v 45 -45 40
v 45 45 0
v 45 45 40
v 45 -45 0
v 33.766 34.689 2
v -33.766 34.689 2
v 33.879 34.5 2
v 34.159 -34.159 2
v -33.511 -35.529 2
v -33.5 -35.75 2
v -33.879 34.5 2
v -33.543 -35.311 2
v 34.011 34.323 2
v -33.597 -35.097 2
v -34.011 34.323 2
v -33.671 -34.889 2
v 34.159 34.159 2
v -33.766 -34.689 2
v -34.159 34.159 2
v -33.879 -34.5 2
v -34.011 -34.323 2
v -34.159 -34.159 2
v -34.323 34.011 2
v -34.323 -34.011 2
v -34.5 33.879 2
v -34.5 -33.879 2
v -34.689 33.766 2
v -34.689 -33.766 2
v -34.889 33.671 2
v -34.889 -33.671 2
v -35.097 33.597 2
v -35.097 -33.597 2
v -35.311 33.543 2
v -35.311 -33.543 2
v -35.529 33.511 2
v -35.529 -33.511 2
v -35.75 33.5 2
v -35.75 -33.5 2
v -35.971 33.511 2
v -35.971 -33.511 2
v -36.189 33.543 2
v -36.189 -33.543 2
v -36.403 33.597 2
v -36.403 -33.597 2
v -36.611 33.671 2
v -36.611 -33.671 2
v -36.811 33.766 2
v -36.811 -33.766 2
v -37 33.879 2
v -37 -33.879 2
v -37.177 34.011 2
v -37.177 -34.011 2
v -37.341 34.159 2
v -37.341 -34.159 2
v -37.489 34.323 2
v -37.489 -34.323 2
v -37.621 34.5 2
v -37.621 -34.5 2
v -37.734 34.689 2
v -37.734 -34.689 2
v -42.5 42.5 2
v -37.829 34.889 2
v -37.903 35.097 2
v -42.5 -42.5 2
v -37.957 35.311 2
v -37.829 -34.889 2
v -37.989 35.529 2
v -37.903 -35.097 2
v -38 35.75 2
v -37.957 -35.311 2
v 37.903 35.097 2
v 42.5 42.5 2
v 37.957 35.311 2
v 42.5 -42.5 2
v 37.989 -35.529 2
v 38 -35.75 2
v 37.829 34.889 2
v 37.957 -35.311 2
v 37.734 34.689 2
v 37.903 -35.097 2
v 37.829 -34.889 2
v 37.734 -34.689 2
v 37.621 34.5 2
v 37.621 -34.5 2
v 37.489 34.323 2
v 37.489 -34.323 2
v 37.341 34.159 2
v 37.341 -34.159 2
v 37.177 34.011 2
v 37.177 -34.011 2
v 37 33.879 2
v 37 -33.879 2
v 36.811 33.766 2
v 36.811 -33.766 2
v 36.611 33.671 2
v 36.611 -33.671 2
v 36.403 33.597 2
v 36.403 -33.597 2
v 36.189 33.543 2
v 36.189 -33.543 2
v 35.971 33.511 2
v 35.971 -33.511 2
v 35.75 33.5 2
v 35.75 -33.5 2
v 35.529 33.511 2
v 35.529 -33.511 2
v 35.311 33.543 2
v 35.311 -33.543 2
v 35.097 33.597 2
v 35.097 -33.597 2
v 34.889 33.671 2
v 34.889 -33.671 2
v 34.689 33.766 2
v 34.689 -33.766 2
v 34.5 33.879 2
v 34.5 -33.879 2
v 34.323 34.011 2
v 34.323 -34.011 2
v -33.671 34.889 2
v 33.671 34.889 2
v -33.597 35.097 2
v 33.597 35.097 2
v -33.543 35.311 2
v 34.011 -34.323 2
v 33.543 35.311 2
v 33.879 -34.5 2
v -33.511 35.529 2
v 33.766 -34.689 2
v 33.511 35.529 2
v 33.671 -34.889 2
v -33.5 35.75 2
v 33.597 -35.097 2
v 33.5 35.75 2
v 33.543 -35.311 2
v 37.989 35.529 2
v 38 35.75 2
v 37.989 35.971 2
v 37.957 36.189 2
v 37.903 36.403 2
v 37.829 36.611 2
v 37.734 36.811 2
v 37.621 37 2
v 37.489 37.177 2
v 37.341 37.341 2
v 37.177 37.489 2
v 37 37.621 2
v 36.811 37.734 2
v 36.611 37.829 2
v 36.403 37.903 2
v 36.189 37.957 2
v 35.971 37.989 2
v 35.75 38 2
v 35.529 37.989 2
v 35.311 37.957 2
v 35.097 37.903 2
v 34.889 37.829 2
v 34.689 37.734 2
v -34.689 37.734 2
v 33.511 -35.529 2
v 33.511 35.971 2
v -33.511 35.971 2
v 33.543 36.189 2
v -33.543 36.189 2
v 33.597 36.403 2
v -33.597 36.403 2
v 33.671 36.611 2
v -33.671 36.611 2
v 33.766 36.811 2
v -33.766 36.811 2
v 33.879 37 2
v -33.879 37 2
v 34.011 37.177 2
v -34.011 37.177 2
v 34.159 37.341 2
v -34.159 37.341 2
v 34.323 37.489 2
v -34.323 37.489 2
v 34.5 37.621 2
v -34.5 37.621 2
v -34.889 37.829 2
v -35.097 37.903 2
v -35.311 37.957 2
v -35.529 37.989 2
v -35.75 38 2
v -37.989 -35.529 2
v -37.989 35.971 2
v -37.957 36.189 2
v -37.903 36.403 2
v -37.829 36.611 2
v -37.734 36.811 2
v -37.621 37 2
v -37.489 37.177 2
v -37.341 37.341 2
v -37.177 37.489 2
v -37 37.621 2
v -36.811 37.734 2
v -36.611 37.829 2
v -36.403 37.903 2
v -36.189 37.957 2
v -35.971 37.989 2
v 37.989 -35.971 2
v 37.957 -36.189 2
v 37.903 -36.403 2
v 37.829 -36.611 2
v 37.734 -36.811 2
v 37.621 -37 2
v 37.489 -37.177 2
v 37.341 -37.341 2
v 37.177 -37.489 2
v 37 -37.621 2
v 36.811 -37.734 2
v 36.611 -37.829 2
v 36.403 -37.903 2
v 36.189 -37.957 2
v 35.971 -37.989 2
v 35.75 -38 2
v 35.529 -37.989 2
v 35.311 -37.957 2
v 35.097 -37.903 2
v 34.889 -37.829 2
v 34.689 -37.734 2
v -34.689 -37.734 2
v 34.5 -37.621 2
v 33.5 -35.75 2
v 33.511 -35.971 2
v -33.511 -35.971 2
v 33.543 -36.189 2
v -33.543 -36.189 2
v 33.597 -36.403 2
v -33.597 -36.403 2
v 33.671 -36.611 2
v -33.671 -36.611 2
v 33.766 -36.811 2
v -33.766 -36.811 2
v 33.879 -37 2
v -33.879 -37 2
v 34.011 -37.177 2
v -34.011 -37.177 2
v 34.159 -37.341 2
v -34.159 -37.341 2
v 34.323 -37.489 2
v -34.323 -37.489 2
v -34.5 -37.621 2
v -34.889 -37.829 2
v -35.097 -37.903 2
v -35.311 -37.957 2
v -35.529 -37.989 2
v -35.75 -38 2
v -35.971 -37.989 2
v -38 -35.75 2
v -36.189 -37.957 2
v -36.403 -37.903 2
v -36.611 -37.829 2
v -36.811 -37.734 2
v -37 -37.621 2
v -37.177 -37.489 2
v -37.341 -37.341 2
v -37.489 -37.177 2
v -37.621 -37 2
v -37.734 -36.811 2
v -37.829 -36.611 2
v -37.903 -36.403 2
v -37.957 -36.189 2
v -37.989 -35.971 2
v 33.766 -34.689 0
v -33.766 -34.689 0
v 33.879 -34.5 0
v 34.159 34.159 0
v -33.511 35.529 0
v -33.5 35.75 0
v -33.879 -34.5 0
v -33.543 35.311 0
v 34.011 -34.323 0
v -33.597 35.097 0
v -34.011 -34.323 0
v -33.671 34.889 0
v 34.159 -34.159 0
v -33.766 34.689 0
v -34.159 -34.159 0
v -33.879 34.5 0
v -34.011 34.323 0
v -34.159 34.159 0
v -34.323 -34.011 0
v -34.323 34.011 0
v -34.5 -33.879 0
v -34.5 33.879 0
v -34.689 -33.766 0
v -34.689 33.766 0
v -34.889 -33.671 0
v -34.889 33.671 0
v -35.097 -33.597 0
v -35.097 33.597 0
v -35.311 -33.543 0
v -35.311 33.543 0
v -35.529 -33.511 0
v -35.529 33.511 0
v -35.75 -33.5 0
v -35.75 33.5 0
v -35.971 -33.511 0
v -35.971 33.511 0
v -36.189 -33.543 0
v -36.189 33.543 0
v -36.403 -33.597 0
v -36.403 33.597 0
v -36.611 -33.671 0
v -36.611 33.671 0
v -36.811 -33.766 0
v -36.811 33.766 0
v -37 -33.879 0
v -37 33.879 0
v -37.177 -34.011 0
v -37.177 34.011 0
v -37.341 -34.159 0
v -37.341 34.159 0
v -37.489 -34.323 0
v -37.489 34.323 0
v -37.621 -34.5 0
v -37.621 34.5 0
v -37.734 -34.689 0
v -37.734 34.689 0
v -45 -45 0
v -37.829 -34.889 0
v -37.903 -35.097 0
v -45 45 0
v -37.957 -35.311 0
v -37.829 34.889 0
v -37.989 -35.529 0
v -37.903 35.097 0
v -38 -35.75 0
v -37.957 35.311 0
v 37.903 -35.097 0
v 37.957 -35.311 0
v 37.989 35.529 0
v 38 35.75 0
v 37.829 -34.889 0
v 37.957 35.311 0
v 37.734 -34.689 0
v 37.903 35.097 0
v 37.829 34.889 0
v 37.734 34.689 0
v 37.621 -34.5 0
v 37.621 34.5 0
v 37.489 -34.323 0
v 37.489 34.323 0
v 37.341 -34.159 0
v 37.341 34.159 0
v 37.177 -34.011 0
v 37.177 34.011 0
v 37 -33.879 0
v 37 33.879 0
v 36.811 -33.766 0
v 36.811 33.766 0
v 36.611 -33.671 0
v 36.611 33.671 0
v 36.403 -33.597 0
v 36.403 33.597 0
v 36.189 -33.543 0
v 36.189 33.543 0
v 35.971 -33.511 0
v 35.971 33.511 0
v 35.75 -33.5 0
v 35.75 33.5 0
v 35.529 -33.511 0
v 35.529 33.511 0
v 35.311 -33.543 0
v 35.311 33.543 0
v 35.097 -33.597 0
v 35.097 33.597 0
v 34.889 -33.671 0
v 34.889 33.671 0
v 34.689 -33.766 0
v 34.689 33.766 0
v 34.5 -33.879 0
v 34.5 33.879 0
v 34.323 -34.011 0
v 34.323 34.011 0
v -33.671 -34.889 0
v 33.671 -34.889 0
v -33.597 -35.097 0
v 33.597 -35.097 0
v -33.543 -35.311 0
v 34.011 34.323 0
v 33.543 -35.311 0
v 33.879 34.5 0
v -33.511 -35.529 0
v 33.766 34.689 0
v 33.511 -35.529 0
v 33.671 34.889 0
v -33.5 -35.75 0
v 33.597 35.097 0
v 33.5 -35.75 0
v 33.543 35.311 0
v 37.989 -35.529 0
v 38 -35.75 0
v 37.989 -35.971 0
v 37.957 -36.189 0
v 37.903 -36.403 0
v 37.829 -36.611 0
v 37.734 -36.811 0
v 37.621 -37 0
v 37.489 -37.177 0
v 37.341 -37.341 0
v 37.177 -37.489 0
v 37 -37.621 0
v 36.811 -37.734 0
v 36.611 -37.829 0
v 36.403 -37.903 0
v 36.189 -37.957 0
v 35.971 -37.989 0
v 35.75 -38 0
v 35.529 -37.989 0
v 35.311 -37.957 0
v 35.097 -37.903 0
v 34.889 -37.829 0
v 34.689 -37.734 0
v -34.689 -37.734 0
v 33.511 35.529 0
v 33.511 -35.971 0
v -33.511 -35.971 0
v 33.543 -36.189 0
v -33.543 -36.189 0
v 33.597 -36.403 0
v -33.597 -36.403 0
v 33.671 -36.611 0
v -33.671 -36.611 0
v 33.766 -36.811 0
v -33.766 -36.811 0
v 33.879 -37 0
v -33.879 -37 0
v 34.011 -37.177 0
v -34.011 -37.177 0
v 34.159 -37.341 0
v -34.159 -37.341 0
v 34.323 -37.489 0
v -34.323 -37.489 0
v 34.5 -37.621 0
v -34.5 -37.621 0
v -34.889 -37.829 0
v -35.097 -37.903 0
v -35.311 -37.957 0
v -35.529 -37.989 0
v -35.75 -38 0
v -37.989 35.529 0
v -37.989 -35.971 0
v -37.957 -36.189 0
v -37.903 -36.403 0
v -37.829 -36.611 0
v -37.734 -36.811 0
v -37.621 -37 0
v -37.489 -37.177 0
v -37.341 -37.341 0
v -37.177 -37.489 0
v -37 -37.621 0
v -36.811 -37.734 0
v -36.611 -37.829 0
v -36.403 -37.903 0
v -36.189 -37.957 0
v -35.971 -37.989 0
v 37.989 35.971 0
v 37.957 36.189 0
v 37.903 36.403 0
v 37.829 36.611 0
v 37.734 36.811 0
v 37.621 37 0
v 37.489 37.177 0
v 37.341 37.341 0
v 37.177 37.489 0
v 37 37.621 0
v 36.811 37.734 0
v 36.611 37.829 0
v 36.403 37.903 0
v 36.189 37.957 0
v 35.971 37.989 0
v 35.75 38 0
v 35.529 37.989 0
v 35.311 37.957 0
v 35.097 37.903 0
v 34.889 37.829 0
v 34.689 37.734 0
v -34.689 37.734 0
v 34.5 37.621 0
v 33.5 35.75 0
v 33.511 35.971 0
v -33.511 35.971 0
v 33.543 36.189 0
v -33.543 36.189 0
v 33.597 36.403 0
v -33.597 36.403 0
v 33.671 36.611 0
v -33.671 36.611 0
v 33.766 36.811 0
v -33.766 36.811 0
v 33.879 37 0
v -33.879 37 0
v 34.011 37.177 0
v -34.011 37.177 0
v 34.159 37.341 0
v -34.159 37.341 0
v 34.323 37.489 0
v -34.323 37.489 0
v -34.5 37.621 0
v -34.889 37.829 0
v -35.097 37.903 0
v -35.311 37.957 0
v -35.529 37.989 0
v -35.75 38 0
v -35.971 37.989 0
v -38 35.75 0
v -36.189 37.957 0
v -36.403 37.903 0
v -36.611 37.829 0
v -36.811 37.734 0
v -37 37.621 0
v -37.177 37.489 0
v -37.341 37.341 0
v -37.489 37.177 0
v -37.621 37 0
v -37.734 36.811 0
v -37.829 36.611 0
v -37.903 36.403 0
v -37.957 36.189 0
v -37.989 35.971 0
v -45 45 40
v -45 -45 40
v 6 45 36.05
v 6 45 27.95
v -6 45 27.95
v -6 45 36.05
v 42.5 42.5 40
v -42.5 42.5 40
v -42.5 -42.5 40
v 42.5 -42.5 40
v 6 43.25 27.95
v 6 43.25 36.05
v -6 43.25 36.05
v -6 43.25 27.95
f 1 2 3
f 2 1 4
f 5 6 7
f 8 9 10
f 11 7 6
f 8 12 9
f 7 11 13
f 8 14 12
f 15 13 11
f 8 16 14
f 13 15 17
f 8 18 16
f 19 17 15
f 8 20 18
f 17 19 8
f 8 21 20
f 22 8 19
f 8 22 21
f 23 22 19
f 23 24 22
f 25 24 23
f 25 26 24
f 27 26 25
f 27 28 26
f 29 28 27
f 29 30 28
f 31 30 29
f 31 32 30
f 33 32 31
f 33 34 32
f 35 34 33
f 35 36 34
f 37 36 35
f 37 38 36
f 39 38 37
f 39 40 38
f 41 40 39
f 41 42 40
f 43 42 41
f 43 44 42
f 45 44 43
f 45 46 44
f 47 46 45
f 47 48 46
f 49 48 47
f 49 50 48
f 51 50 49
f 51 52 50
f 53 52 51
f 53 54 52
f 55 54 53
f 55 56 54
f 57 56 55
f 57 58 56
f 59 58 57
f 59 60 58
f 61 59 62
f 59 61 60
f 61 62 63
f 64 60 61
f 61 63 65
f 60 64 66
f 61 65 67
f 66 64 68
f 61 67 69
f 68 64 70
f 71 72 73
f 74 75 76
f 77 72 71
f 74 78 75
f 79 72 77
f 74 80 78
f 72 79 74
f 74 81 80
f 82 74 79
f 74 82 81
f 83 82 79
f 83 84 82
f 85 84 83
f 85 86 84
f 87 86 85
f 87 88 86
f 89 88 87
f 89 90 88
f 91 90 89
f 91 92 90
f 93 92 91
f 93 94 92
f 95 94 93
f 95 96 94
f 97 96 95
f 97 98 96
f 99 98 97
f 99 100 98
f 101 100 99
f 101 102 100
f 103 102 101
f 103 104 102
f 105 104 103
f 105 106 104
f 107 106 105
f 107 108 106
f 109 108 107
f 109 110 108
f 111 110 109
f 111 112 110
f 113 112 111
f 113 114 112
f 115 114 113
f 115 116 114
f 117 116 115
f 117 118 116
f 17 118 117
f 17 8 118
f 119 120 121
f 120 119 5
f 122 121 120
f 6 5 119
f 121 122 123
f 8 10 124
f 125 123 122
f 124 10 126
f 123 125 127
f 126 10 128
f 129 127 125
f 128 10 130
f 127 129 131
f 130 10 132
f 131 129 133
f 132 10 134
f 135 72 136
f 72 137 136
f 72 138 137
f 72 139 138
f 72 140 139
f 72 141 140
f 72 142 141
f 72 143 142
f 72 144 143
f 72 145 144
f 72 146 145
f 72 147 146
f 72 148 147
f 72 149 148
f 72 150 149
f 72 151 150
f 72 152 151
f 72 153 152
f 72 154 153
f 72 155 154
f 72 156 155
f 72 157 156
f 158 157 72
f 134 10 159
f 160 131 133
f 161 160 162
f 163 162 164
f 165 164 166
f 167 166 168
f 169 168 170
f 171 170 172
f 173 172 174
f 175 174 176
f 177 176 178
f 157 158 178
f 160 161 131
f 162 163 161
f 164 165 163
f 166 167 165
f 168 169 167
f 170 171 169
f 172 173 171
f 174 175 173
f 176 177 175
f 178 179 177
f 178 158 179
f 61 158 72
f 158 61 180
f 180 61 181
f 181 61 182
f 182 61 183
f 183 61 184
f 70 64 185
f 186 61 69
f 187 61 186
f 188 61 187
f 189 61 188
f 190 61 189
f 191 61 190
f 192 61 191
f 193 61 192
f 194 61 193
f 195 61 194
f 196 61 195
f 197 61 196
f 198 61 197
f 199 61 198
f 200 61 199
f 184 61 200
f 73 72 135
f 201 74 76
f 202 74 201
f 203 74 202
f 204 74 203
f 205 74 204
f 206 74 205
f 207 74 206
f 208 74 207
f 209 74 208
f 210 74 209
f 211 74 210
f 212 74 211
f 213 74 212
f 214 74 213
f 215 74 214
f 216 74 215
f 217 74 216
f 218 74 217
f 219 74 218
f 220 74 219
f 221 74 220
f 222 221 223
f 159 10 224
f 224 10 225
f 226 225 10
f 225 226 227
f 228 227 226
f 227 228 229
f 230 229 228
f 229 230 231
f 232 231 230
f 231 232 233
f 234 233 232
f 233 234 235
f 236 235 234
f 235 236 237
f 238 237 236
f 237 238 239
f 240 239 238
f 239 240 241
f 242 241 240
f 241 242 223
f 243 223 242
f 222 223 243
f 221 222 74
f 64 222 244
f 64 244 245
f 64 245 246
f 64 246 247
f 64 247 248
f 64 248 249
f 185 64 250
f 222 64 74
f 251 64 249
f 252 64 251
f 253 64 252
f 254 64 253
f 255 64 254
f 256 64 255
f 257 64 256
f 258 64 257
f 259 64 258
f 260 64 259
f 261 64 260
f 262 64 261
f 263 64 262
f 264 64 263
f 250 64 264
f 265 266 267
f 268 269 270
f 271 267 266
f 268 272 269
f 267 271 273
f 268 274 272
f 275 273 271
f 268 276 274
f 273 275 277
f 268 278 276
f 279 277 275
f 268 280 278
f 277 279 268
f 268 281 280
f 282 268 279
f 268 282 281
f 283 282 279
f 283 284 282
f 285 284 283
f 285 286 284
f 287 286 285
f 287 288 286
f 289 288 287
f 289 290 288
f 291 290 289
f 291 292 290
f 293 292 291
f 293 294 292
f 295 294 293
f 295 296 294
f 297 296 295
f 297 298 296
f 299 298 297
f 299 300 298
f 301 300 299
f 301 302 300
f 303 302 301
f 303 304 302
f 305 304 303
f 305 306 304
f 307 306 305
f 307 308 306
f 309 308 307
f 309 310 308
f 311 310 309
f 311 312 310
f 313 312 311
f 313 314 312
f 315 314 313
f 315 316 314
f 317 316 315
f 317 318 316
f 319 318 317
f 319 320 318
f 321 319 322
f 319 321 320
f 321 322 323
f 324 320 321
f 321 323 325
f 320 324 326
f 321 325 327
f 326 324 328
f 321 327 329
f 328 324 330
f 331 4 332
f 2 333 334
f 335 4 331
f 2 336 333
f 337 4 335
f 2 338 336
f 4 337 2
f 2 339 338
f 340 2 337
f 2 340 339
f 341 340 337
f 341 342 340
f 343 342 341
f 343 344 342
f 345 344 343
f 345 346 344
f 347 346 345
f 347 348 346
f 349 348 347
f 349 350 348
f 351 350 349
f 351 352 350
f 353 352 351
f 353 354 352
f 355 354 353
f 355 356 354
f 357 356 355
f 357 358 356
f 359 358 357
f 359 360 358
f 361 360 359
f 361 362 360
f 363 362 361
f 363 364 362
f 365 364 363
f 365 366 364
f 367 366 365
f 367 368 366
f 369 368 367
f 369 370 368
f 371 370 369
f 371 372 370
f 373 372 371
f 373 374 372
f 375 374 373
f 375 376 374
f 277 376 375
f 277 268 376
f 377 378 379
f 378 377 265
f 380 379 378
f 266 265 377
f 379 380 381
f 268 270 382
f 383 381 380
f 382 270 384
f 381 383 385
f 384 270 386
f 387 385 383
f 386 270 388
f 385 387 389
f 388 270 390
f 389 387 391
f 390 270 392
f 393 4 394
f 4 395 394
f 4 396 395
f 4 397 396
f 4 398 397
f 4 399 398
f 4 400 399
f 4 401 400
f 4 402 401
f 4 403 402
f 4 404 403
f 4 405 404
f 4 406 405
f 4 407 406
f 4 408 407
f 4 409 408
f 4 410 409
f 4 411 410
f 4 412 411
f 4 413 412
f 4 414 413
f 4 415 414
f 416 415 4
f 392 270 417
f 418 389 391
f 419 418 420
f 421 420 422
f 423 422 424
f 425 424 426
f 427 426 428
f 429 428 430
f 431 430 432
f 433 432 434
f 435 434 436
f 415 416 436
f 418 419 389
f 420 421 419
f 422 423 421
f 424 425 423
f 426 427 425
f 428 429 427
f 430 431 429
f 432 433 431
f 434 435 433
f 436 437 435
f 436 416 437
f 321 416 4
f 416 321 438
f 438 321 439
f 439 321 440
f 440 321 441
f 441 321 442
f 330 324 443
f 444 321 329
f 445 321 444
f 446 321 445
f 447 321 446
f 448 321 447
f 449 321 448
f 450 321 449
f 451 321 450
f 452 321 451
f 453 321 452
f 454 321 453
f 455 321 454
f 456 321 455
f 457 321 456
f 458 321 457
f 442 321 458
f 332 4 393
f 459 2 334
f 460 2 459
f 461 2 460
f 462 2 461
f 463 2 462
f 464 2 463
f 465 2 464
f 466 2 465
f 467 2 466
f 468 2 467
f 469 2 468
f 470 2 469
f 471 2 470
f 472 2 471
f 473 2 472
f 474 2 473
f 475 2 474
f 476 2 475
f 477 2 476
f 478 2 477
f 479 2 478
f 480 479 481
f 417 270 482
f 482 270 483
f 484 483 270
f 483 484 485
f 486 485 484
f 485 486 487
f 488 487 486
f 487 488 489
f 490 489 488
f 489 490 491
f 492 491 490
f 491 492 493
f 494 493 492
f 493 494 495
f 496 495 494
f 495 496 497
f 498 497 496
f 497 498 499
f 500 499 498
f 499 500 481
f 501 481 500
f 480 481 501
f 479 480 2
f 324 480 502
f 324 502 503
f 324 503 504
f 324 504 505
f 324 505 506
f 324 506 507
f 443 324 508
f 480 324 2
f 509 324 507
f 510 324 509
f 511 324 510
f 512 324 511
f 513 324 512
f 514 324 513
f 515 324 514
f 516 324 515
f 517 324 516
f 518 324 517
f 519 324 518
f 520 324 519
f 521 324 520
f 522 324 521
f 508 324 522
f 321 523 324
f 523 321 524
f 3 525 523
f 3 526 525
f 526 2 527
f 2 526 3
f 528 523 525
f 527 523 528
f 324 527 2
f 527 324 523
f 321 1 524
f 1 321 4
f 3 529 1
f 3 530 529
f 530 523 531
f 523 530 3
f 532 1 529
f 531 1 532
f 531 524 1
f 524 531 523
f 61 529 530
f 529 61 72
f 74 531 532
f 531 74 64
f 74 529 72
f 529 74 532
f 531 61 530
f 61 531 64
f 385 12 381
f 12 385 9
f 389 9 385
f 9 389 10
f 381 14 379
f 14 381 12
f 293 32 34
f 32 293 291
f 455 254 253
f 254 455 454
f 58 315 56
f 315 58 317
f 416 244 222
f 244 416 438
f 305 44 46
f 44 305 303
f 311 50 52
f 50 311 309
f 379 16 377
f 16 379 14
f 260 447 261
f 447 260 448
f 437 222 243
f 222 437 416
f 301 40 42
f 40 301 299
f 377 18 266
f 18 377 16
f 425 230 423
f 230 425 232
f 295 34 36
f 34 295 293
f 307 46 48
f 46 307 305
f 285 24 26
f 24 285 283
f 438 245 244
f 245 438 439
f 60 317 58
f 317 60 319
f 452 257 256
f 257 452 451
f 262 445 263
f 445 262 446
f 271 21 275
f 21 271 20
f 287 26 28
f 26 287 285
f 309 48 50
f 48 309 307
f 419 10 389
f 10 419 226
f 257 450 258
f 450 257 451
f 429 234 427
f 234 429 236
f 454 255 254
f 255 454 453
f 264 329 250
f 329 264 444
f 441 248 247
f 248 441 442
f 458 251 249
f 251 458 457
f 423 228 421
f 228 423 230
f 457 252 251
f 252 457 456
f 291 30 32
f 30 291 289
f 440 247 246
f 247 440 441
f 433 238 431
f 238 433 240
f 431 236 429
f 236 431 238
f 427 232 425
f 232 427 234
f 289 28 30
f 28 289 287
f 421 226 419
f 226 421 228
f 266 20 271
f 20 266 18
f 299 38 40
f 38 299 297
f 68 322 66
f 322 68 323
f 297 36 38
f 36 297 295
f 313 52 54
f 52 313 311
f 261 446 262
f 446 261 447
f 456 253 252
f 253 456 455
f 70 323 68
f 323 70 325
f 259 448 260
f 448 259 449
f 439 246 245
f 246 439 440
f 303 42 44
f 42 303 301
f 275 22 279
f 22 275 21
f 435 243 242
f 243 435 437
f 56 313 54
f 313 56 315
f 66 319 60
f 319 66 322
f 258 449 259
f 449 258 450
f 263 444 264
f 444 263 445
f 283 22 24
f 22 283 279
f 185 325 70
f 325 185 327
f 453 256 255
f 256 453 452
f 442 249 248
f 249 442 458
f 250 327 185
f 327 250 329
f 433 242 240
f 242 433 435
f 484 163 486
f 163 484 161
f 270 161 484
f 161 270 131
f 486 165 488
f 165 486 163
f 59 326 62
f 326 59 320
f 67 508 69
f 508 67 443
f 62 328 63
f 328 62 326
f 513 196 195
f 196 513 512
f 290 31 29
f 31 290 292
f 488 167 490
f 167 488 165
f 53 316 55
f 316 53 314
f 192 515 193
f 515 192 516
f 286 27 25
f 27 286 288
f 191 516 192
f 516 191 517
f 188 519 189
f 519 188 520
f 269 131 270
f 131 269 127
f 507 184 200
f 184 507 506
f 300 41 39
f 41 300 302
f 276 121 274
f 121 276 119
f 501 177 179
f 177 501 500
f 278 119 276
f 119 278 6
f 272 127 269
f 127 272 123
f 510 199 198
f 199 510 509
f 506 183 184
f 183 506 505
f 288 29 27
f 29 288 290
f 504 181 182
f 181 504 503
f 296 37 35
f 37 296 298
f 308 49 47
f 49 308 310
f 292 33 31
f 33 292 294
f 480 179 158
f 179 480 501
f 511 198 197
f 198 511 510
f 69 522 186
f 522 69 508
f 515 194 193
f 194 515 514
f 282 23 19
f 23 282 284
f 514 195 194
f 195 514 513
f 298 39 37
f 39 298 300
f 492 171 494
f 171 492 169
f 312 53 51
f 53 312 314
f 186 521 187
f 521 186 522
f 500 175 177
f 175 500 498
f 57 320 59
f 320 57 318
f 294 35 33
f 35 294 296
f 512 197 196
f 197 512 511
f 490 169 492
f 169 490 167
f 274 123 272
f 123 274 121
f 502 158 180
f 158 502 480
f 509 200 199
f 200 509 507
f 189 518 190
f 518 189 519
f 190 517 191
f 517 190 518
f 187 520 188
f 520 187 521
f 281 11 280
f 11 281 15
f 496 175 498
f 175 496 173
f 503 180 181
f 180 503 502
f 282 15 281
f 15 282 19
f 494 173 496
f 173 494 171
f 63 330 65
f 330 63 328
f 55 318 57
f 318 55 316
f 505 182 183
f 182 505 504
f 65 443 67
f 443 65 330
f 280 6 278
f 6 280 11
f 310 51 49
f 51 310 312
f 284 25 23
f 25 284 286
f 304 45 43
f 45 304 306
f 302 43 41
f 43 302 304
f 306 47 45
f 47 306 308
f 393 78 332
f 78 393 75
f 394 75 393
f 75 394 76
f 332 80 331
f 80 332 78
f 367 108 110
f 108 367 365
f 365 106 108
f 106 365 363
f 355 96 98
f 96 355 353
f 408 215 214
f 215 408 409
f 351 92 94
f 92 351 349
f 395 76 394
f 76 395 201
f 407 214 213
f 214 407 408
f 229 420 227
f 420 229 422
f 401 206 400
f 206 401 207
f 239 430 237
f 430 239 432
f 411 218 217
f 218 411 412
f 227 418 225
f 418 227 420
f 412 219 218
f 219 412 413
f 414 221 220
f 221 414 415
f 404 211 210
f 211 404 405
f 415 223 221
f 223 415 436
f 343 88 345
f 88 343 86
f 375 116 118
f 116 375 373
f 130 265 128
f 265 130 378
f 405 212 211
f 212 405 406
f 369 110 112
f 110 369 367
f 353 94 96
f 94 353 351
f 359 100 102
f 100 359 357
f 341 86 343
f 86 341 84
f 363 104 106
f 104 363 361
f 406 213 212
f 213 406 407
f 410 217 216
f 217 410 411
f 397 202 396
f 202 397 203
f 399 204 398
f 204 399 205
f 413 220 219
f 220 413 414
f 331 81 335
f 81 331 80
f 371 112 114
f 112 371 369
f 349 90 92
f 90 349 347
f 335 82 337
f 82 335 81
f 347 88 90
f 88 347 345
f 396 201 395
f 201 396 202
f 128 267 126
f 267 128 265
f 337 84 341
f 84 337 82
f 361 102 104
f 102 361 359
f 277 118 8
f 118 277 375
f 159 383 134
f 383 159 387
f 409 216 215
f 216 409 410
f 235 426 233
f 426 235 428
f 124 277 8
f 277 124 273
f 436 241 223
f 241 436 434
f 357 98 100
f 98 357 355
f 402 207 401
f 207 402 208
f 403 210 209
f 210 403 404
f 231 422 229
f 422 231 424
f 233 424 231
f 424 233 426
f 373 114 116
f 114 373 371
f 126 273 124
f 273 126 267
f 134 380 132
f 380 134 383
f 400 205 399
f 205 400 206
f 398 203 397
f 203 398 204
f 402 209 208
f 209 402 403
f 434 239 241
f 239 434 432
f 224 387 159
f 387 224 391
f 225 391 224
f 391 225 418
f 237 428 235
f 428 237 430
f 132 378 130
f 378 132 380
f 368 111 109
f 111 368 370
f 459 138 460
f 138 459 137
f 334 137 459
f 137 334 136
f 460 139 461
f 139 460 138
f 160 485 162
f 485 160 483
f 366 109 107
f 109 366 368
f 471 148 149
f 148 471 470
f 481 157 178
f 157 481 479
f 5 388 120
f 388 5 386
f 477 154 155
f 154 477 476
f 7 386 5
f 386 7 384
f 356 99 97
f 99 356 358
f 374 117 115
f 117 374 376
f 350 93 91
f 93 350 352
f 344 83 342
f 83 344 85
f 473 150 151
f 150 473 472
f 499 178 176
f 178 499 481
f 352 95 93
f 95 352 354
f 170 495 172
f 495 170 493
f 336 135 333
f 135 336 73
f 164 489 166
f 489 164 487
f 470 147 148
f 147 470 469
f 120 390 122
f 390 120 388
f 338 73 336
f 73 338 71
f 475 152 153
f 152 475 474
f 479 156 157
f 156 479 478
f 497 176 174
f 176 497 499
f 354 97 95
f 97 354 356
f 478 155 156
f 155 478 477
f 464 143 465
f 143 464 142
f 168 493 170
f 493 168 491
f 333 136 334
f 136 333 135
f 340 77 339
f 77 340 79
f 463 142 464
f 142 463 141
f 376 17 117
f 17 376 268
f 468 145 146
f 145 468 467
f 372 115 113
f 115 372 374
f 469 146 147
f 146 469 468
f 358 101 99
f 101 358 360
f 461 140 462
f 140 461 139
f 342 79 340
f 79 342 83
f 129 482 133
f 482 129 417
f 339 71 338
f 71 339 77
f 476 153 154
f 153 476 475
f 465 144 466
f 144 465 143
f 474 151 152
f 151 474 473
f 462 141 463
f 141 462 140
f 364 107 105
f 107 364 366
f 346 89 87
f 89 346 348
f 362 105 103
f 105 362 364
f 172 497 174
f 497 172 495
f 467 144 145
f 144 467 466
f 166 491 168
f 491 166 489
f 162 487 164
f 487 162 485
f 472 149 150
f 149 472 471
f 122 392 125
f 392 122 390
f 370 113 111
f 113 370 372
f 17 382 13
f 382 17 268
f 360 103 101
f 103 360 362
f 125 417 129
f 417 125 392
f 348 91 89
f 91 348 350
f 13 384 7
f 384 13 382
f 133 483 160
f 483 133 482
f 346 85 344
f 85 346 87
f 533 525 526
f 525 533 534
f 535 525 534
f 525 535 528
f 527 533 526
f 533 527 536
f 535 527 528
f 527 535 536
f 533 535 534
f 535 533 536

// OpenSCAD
// DIY Magnetic Stirrer Housing for 80mm PC Fan
// Designed for FDM 3D printing
// Print orientation: Upside down (top plate on bed)

// --- Dimensions (mm) ---
plate_thickness = 2;       // Thickness of the top plate (stirring surface)
wall_thickness = 2.5;      // Thickness of the side walls
box_outer_size = 90;       // Outer dimension of the box (X and Y)
box_height = 40;           // Height of the walls (from top plate to open edge)
hole_diameter = 4.5;       // Diameter for M4 screw holes
hole_pattern = 71.5;       // Center-to-center distance of the 4-hole square pattern
notch_width = 12;          // Width of the power cable notch
notch_depth = 8;           // Depth of the notch from the open edge (z=40 down to z=32)

// --- Derived Dimensions ---
hole_offset = hole_pattern / 2; // Distance from center to each hole
notch_z_start = box_height - notch_depth; // Z position where notch starts (32)

// --- Main Structure ---
$fn = 64; // High resolution for smooth holes and curves

difference() {
    // Union of the box components
    union() {
        // Top Plate (rests on z=0 to z=plate_thickness)
        translate([-box_outer_size/2, -box_outer_size/2, 0])
            cube([box_outer_size, box_outer_size, plate_thickness]);

        // Four Walls (rise from top plate to z=box_height)
        // Front Wall (positive Y)
        translate([-box_outer_size/2, box_outer_size/2 - wall_thickness, plate_thickness])
            cube([box_outer_size, wall_thickness, box_height - plate_thickness]);

        // Back Wall (negative Y)
        translate([-box_outer_size/2, -box_outer_size/2, plate_thickness])
            cube([box_outer_size, wall_thickness, box_height - plate_thickness]);

        // Right Wall (positive X)
        translate([box_outer_size/2 - wall_thickness, -box_outer_size/2, plate_thickness])
            cube([wall_thickness, box_outer_size, box_height - plate_thickness]);

        // Left Wall (negative X)
        translate([-box_outer_size/2, -box_outer_size/2, plate_thickness])
            cube([wall_thickness, box_outer_size, box_height - plate_thickness]);
    }

    // --- Cutouts ---

    // 1. Four M4 Screw Holes in the Top Plate
    // Pattern is centered on the plate, 71.5mm square
    for (x = [-hole_offset, hole_offset]) {
        for (y = [-hole_offset, hole_offset]) {
            translate([x, y, -0.1]) // Extend slightly below z=0 to ensure clean cut
                cylinder(h = plate_thickness + 0.2, r = hole_diameter / 2, center = false);
        }
    }

    // 2. Power Cable Notch in One Wall
    // Cut in the "Front" wall (positive Y side)
    // Notch is 12mm wide, centered on the wall, from z=32 to z=40
    translate([0, box_outer_size/2, notch_z_start])
        cube([notch_width, wall_thickness + 1, notch_depth + 0.1], center = true);
}
